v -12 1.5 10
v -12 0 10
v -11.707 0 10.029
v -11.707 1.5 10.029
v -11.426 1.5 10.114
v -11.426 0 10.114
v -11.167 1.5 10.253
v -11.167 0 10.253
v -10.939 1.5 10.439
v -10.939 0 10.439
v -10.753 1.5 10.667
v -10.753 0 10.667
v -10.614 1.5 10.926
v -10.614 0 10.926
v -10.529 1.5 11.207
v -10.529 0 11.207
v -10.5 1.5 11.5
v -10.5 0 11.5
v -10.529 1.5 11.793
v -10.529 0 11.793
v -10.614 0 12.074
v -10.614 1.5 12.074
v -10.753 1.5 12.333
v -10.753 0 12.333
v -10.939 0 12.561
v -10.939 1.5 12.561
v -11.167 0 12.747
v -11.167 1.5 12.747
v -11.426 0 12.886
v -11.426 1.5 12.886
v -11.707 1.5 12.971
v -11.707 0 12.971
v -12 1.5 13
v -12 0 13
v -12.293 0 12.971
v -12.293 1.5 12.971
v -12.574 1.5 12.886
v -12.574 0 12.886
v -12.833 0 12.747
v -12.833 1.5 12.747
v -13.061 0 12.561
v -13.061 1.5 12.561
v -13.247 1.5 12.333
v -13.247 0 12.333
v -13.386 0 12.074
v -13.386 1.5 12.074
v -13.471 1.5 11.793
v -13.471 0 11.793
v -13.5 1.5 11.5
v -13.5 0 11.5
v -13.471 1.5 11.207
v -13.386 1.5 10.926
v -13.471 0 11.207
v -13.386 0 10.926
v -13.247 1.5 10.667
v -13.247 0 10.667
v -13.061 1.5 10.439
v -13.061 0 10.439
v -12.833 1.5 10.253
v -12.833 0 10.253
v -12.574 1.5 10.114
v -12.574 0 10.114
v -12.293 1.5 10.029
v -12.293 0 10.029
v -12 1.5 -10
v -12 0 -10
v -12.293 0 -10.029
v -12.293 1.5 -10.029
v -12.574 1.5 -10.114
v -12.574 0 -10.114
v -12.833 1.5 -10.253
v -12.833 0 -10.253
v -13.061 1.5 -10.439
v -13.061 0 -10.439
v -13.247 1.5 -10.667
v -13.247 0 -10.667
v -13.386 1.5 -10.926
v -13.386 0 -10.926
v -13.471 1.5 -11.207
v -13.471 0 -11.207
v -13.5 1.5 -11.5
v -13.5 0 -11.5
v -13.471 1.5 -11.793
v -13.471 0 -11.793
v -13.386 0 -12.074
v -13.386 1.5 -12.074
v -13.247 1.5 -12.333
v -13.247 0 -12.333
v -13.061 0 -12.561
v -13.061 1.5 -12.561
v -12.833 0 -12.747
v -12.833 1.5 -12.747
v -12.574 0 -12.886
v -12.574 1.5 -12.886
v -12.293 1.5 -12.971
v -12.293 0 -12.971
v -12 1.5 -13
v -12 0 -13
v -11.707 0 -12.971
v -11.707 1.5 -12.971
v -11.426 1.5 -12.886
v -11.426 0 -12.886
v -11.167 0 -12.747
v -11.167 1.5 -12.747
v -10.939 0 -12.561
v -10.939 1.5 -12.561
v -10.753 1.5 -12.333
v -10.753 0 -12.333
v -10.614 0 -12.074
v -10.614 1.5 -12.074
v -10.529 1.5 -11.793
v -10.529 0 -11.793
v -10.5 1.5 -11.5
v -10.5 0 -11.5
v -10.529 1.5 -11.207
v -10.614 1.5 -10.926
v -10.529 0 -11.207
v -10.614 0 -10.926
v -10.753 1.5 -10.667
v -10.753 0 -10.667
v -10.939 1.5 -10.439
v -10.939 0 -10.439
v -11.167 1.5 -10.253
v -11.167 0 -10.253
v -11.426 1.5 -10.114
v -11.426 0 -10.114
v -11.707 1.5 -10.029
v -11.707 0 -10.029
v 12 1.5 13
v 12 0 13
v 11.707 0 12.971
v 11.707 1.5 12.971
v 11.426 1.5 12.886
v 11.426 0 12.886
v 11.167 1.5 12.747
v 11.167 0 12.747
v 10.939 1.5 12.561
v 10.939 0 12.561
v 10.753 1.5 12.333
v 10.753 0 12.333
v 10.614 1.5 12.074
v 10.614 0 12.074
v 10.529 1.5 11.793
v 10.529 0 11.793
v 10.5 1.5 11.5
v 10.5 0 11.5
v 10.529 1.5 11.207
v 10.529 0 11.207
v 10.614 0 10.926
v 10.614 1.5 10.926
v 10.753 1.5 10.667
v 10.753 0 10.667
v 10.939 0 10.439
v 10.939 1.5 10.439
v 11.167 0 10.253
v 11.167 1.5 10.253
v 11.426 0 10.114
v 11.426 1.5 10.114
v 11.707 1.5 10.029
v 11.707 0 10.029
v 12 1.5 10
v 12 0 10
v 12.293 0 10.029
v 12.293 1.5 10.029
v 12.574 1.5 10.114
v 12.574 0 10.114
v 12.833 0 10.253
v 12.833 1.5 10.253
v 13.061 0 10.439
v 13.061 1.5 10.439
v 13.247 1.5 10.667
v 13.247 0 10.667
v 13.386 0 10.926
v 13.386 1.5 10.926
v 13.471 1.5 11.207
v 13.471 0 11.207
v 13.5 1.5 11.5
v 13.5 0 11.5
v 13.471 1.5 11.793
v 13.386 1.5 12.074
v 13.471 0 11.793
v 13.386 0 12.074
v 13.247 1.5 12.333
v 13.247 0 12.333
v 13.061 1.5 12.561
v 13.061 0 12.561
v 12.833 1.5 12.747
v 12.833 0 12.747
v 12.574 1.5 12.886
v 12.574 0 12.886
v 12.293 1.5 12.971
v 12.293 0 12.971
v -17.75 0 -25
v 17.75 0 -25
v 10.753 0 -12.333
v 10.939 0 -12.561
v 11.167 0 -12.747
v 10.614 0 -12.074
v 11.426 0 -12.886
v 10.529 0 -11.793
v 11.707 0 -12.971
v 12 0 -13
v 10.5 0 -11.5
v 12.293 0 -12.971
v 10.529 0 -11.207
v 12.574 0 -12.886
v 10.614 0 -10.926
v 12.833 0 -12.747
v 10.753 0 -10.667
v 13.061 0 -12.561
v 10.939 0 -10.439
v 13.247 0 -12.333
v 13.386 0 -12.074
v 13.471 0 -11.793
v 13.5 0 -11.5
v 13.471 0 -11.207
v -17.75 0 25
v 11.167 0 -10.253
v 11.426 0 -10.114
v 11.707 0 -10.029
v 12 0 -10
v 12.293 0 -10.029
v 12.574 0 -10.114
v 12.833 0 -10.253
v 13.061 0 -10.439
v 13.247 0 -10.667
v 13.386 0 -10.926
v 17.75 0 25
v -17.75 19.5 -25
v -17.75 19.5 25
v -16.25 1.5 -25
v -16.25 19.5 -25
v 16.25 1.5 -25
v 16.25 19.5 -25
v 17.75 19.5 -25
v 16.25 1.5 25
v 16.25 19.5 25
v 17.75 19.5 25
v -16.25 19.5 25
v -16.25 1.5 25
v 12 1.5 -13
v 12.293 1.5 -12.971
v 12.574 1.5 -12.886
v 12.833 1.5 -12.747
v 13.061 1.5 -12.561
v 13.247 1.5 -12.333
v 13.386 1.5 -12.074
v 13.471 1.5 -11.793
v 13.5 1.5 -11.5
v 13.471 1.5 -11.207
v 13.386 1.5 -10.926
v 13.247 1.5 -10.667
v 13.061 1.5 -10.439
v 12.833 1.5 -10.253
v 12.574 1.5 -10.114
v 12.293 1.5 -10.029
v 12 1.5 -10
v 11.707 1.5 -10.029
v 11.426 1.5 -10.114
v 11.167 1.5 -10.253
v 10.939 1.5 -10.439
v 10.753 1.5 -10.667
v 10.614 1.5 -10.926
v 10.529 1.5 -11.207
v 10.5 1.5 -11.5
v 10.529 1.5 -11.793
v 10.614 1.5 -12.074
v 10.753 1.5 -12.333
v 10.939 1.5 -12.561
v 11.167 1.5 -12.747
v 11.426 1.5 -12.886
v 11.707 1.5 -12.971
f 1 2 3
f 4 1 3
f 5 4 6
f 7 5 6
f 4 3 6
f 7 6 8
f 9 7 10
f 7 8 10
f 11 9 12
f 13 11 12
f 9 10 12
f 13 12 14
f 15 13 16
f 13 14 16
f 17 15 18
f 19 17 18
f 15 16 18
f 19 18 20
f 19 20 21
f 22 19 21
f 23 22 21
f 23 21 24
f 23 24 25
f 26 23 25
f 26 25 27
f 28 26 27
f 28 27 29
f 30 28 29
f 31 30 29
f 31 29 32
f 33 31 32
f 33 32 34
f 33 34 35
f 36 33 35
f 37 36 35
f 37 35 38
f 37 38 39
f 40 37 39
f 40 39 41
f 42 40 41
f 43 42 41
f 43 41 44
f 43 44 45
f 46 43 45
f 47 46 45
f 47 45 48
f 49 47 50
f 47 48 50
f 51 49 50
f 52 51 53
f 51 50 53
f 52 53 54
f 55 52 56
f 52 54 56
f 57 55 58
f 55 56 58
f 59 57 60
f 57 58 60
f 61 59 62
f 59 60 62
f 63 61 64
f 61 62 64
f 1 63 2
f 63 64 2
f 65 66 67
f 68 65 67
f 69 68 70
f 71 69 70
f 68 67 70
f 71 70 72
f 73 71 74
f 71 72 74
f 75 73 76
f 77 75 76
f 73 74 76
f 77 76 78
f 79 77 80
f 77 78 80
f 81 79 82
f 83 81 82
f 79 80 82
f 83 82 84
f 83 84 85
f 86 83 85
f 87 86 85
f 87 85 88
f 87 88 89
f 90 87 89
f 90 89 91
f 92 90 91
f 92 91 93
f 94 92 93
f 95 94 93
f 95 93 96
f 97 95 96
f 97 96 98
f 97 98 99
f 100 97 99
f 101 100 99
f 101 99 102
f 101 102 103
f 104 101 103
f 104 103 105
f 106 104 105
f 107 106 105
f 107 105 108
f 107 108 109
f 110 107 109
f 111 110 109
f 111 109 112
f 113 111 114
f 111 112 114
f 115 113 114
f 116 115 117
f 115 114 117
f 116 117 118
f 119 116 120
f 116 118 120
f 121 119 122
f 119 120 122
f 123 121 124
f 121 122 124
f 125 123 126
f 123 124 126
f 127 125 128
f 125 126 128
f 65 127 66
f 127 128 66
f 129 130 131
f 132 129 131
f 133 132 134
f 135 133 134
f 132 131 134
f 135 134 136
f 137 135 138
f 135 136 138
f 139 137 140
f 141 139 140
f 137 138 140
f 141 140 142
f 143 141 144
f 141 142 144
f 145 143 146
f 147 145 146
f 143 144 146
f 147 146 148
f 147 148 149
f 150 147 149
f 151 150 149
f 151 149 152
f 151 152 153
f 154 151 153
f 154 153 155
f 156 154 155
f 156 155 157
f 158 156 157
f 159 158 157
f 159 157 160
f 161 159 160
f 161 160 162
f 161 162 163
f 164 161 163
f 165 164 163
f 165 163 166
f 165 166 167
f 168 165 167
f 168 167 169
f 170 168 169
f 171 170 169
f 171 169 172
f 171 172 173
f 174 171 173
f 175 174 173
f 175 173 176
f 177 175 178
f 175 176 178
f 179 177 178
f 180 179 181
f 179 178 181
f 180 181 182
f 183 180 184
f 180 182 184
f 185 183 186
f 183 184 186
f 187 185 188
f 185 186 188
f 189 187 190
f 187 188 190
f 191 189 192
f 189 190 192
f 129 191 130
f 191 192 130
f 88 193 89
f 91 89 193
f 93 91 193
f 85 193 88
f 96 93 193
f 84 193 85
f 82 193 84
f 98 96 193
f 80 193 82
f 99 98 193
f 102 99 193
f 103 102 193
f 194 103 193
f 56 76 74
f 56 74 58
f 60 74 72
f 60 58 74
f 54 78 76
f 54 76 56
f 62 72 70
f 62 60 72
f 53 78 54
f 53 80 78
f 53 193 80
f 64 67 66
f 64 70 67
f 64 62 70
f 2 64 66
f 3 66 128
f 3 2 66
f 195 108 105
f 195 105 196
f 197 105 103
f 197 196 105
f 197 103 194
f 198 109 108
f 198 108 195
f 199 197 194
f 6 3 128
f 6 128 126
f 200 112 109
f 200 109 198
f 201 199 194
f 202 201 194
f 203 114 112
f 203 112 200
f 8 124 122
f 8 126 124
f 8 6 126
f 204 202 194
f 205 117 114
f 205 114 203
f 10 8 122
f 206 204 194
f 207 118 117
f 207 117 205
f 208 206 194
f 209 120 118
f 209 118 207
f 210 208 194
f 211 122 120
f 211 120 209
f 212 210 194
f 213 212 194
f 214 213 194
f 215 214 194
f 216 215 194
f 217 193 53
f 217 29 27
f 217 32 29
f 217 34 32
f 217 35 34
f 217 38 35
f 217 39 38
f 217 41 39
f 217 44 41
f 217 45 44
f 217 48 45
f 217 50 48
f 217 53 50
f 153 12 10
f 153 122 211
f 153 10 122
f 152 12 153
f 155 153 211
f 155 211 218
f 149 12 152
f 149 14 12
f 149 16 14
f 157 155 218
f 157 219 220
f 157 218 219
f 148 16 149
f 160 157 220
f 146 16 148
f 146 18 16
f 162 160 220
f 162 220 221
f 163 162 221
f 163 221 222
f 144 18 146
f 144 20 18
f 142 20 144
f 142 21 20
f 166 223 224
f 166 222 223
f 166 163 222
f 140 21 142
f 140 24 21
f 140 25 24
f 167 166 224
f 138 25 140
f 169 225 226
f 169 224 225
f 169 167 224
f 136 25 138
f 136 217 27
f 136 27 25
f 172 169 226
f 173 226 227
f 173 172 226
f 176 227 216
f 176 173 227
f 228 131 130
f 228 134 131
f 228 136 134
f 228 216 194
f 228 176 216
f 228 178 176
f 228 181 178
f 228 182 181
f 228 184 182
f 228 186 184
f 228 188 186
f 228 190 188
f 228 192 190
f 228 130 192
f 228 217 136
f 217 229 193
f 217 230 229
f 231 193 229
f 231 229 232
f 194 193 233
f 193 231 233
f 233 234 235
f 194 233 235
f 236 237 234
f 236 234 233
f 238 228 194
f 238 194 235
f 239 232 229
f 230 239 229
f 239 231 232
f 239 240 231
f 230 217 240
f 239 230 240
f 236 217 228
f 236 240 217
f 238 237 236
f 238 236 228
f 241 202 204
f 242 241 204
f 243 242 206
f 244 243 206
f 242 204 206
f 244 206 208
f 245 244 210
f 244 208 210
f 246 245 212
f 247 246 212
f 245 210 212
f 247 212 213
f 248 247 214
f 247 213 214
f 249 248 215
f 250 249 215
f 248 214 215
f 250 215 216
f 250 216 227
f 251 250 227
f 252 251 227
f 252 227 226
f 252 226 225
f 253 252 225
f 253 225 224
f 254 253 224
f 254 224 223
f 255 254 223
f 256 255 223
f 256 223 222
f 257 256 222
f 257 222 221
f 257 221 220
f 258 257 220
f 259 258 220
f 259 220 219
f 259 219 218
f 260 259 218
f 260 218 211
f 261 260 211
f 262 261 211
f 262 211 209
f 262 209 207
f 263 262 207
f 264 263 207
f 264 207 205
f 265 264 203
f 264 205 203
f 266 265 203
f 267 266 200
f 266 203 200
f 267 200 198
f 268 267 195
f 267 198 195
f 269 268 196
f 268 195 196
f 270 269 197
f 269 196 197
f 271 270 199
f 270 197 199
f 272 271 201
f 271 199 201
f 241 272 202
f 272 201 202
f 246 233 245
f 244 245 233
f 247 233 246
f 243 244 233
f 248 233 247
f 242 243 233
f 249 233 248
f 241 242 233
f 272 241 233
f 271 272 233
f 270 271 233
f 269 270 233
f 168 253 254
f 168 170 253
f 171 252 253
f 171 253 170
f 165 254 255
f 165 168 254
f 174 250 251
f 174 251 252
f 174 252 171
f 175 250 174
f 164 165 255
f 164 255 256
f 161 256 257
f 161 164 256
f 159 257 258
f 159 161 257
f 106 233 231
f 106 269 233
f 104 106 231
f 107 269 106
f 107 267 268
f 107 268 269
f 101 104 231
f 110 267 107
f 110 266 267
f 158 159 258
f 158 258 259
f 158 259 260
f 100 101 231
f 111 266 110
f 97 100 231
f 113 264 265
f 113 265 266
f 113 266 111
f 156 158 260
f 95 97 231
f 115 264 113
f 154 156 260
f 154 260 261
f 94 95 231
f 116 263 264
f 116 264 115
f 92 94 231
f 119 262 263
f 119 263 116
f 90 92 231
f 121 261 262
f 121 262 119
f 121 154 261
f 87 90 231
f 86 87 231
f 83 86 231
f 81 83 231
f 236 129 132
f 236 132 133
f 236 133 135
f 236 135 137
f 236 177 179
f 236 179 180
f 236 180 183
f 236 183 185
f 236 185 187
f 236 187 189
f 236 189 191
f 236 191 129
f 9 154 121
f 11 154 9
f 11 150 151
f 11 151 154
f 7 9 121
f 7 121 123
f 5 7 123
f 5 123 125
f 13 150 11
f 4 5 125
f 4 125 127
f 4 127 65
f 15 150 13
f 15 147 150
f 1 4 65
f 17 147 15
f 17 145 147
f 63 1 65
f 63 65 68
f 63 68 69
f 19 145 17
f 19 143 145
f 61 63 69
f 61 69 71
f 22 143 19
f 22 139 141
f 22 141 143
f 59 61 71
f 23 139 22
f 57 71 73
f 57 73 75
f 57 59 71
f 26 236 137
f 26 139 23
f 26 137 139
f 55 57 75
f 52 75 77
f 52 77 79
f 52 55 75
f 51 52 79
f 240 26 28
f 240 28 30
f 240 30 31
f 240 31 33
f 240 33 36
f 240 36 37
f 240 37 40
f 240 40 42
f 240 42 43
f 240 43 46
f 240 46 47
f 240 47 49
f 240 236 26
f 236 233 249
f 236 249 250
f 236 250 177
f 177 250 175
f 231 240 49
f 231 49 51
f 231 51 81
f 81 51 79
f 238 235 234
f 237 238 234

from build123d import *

# Parameters (mm, degrees)
EXTRU_MINCE1_DEPTH      = 25
ESQUISSE2_R             = 1.5
ENL_V_MAT_EXTRU_1_DEPTH = 3


with BuildPart() as part:
    # Esquisse1 → Extru.-Mince1 (new, symmetric)
    with BuildSketch(Plane.XY):
        Polygon((-17.75, 19.5), (-17.75, 0), (17.75, 0), (17.75, 19.5), (16.25, 19.5), (16.25, 1.5), (-16.25, 1.5), (-16.25, 19.5), align=None)
    extrude(amount=EXTRU_MINCE1_DEPTH, both=True)

    # Esquisse2 → Enlèv. mat.-Extru.1 (cut)
    with BuildSketch(Plane.XZ):
        with Locations(Location((-12, 11.5, 0), (0, 0, 270))):
            Circle(ESQUISSE2_R)
        with Locations(Location((-12, -11.5, 0), (0, 0, 90))):
            Circle(ESQUISSE2_R)
        with Locations(Location((12, -11.5, 0), (0, 0, 270))):
            Circle(ESQUISSE2_R)
        with Locations(Location((12, 11.5, 0), (0, 0, 90))):
            Circle(ESQUISSE2_R)
    extrude(amount=-ENL_V_MAT_EXTRU_1_DEPTH, mode=Mode.SUBTRACT)


solid = part.part
